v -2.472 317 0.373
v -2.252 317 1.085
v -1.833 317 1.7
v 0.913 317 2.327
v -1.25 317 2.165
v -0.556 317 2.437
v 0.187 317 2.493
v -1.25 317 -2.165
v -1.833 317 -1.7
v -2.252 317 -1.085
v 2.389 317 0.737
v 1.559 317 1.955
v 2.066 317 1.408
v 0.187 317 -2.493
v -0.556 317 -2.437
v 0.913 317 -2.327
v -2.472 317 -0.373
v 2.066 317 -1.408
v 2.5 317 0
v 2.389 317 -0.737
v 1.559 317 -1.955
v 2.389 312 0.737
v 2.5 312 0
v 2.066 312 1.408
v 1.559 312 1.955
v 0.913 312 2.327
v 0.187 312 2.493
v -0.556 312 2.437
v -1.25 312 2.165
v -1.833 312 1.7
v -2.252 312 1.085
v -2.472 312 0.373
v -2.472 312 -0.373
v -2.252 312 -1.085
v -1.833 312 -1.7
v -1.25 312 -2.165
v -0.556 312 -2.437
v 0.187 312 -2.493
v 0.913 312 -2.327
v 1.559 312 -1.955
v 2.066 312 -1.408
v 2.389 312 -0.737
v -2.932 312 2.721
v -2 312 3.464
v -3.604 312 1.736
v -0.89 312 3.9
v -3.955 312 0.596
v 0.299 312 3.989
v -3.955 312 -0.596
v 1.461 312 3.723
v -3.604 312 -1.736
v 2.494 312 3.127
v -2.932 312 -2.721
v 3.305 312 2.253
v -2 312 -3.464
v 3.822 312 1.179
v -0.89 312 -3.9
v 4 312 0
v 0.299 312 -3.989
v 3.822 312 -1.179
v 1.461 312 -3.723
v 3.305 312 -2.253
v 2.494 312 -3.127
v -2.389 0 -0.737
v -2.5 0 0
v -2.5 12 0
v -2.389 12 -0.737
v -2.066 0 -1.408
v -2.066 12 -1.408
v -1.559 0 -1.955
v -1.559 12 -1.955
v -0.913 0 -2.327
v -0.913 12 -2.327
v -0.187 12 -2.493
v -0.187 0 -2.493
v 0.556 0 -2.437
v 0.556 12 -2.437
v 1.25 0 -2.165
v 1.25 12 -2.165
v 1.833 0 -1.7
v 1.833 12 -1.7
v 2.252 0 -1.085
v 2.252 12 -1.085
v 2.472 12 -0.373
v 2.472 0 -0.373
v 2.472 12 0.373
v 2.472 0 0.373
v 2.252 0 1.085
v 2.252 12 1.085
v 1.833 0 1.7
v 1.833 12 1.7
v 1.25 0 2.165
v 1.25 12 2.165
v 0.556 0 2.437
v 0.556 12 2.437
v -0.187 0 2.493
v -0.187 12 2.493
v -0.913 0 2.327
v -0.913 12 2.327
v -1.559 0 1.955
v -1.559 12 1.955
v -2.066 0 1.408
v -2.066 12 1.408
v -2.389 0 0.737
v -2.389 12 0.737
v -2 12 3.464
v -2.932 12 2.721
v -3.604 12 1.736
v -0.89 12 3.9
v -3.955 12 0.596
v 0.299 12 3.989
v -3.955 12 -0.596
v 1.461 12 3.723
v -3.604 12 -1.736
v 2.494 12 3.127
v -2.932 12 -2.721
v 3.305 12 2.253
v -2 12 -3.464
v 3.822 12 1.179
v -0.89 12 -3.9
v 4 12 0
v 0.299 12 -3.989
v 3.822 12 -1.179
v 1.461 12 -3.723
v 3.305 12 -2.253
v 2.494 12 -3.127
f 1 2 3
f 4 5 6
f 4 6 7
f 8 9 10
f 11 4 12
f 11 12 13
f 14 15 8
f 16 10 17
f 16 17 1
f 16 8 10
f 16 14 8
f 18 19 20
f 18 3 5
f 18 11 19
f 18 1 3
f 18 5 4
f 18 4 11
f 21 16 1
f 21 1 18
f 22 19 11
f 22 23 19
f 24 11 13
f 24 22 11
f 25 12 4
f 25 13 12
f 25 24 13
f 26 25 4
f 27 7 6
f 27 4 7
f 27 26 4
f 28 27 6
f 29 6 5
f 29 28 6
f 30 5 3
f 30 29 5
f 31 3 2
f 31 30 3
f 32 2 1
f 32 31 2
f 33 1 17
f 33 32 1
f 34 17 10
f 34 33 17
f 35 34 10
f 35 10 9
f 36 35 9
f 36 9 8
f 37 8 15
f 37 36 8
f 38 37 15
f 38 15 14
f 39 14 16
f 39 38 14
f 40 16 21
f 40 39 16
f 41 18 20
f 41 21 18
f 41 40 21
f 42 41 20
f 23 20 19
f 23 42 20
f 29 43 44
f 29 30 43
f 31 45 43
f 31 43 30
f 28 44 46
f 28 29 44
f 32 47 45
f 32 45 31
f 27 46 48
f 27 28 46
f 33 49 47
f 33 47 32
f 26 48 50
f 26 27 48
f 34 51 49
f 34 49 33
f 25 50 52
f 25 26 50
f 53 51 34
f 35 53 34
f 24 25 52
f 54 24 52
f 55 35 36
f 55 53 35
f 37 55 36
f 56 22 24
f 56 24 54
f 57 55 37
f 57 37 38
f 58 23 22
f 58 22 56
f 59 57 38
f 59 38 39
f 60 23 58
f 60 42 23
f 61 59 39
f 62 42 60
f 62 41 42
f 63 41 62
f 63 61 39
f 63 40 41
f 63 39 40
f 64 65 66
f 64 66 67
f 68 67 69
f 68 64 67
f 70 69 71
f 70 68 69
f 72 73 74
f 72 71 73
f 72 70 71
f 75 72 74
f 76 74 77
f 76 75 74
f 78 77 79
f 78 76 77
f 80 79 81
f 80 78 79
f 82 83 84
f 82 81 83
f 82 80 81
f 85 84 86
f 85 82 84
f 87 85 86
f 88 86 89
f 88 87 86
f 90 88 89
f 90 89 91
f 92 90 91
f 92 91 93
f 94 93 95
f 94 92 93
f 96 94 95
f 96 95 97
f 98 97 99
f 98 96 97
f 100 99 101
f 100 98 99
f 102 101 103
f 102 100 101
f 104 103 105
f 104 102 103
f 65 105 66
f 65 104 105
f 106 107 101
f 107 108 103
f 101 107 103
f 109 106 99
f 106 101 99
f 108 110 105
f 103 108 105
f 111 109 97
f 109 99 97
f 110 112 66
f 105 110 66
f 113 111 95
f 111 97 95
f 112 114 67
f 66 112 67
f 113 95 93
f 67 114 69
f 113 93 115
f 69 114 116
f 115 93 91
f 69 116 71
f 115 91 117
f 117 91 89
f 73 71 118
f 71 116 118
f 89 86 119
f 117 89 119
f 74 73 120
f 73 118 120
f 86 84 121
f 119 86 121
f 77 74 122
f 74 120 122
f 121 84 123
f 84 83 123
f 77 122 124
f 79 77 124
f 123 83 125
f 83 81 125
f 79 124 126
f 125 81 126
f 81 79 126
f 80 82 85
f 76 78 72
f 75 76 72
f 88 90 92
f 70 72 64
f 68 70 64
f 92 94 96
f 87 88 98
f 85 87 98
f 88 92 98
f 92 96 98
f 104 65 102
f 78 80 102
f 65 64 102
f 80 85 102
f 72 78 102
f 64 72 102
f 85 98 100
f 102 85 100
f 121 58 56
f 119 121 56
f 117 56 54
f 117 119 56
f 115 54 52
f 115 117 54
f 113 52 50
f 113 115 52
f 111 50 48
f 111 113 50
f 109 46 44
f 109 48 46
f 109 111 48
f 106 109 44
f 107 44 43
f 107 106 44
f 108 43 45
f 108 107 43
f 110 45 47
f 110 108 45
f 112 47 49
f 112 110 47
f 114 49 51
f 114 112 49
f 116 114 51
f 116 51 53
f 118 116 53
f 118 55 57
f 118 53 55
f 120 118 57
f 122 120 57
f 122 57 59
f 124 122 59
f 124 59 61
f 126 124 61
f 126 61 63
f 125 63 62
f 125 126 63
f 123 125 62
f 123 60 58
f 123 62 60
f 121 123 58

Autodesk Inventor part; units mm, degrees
ref_plane "YZ Plane" through (0, 0, 0) normal (1, 0, 0) x (0, 1, 0)
ref_plane "XZ Plane" through (0, 0, 0) normal (0, 1, 0) x (-1, 0, 0)
ref_plane "XY Plane" through (0, 0, 0) normal (0, 0, 1) x (1, 0, 0)
sketch "Sketch1" plane through (0, 0, 0) normal (0, 1, 0) x (-1, 0, 0)
  circle A0 centre (0, 0) radius 2.5
  dimension "d0" = 5
extrude "Extrusion1" add sketch "Sketch1" along normal blind 12
sketch "Sketch5" plane through (0, 12, 0) normal (0, 1, 0) x (1, 0, 0)
  circle A0 centre (0, 0) radius 2.5 projected
  circle A1 centre (0, 0) radius 4
  dimension "d20" = 8
extrude "Extrusion5" add sketch "Sketch5" along normal blind 300 contours A0 | A1
sketch "Sketch6" plane through (0, 312, 0) normal (0, 1, 0) x (1, 0, 0)
  circle A0 centre (0, 0) radius 4 projected
  circle A1 centre (0, 0) radius 2.5
  dimension "d23" = 5
extrude "Extrusion6" add sketch "Sketch6" along normal blind 5 contours A1
thread "Thread2" size "M10x1.5" class "6g" standard "ANSI Metric M Profile" full length
thread "Thread3" size "TR10x1.5" class "7e" standard "ISO Metric Trapezoidal Threads" full length
properties material "Steel"
